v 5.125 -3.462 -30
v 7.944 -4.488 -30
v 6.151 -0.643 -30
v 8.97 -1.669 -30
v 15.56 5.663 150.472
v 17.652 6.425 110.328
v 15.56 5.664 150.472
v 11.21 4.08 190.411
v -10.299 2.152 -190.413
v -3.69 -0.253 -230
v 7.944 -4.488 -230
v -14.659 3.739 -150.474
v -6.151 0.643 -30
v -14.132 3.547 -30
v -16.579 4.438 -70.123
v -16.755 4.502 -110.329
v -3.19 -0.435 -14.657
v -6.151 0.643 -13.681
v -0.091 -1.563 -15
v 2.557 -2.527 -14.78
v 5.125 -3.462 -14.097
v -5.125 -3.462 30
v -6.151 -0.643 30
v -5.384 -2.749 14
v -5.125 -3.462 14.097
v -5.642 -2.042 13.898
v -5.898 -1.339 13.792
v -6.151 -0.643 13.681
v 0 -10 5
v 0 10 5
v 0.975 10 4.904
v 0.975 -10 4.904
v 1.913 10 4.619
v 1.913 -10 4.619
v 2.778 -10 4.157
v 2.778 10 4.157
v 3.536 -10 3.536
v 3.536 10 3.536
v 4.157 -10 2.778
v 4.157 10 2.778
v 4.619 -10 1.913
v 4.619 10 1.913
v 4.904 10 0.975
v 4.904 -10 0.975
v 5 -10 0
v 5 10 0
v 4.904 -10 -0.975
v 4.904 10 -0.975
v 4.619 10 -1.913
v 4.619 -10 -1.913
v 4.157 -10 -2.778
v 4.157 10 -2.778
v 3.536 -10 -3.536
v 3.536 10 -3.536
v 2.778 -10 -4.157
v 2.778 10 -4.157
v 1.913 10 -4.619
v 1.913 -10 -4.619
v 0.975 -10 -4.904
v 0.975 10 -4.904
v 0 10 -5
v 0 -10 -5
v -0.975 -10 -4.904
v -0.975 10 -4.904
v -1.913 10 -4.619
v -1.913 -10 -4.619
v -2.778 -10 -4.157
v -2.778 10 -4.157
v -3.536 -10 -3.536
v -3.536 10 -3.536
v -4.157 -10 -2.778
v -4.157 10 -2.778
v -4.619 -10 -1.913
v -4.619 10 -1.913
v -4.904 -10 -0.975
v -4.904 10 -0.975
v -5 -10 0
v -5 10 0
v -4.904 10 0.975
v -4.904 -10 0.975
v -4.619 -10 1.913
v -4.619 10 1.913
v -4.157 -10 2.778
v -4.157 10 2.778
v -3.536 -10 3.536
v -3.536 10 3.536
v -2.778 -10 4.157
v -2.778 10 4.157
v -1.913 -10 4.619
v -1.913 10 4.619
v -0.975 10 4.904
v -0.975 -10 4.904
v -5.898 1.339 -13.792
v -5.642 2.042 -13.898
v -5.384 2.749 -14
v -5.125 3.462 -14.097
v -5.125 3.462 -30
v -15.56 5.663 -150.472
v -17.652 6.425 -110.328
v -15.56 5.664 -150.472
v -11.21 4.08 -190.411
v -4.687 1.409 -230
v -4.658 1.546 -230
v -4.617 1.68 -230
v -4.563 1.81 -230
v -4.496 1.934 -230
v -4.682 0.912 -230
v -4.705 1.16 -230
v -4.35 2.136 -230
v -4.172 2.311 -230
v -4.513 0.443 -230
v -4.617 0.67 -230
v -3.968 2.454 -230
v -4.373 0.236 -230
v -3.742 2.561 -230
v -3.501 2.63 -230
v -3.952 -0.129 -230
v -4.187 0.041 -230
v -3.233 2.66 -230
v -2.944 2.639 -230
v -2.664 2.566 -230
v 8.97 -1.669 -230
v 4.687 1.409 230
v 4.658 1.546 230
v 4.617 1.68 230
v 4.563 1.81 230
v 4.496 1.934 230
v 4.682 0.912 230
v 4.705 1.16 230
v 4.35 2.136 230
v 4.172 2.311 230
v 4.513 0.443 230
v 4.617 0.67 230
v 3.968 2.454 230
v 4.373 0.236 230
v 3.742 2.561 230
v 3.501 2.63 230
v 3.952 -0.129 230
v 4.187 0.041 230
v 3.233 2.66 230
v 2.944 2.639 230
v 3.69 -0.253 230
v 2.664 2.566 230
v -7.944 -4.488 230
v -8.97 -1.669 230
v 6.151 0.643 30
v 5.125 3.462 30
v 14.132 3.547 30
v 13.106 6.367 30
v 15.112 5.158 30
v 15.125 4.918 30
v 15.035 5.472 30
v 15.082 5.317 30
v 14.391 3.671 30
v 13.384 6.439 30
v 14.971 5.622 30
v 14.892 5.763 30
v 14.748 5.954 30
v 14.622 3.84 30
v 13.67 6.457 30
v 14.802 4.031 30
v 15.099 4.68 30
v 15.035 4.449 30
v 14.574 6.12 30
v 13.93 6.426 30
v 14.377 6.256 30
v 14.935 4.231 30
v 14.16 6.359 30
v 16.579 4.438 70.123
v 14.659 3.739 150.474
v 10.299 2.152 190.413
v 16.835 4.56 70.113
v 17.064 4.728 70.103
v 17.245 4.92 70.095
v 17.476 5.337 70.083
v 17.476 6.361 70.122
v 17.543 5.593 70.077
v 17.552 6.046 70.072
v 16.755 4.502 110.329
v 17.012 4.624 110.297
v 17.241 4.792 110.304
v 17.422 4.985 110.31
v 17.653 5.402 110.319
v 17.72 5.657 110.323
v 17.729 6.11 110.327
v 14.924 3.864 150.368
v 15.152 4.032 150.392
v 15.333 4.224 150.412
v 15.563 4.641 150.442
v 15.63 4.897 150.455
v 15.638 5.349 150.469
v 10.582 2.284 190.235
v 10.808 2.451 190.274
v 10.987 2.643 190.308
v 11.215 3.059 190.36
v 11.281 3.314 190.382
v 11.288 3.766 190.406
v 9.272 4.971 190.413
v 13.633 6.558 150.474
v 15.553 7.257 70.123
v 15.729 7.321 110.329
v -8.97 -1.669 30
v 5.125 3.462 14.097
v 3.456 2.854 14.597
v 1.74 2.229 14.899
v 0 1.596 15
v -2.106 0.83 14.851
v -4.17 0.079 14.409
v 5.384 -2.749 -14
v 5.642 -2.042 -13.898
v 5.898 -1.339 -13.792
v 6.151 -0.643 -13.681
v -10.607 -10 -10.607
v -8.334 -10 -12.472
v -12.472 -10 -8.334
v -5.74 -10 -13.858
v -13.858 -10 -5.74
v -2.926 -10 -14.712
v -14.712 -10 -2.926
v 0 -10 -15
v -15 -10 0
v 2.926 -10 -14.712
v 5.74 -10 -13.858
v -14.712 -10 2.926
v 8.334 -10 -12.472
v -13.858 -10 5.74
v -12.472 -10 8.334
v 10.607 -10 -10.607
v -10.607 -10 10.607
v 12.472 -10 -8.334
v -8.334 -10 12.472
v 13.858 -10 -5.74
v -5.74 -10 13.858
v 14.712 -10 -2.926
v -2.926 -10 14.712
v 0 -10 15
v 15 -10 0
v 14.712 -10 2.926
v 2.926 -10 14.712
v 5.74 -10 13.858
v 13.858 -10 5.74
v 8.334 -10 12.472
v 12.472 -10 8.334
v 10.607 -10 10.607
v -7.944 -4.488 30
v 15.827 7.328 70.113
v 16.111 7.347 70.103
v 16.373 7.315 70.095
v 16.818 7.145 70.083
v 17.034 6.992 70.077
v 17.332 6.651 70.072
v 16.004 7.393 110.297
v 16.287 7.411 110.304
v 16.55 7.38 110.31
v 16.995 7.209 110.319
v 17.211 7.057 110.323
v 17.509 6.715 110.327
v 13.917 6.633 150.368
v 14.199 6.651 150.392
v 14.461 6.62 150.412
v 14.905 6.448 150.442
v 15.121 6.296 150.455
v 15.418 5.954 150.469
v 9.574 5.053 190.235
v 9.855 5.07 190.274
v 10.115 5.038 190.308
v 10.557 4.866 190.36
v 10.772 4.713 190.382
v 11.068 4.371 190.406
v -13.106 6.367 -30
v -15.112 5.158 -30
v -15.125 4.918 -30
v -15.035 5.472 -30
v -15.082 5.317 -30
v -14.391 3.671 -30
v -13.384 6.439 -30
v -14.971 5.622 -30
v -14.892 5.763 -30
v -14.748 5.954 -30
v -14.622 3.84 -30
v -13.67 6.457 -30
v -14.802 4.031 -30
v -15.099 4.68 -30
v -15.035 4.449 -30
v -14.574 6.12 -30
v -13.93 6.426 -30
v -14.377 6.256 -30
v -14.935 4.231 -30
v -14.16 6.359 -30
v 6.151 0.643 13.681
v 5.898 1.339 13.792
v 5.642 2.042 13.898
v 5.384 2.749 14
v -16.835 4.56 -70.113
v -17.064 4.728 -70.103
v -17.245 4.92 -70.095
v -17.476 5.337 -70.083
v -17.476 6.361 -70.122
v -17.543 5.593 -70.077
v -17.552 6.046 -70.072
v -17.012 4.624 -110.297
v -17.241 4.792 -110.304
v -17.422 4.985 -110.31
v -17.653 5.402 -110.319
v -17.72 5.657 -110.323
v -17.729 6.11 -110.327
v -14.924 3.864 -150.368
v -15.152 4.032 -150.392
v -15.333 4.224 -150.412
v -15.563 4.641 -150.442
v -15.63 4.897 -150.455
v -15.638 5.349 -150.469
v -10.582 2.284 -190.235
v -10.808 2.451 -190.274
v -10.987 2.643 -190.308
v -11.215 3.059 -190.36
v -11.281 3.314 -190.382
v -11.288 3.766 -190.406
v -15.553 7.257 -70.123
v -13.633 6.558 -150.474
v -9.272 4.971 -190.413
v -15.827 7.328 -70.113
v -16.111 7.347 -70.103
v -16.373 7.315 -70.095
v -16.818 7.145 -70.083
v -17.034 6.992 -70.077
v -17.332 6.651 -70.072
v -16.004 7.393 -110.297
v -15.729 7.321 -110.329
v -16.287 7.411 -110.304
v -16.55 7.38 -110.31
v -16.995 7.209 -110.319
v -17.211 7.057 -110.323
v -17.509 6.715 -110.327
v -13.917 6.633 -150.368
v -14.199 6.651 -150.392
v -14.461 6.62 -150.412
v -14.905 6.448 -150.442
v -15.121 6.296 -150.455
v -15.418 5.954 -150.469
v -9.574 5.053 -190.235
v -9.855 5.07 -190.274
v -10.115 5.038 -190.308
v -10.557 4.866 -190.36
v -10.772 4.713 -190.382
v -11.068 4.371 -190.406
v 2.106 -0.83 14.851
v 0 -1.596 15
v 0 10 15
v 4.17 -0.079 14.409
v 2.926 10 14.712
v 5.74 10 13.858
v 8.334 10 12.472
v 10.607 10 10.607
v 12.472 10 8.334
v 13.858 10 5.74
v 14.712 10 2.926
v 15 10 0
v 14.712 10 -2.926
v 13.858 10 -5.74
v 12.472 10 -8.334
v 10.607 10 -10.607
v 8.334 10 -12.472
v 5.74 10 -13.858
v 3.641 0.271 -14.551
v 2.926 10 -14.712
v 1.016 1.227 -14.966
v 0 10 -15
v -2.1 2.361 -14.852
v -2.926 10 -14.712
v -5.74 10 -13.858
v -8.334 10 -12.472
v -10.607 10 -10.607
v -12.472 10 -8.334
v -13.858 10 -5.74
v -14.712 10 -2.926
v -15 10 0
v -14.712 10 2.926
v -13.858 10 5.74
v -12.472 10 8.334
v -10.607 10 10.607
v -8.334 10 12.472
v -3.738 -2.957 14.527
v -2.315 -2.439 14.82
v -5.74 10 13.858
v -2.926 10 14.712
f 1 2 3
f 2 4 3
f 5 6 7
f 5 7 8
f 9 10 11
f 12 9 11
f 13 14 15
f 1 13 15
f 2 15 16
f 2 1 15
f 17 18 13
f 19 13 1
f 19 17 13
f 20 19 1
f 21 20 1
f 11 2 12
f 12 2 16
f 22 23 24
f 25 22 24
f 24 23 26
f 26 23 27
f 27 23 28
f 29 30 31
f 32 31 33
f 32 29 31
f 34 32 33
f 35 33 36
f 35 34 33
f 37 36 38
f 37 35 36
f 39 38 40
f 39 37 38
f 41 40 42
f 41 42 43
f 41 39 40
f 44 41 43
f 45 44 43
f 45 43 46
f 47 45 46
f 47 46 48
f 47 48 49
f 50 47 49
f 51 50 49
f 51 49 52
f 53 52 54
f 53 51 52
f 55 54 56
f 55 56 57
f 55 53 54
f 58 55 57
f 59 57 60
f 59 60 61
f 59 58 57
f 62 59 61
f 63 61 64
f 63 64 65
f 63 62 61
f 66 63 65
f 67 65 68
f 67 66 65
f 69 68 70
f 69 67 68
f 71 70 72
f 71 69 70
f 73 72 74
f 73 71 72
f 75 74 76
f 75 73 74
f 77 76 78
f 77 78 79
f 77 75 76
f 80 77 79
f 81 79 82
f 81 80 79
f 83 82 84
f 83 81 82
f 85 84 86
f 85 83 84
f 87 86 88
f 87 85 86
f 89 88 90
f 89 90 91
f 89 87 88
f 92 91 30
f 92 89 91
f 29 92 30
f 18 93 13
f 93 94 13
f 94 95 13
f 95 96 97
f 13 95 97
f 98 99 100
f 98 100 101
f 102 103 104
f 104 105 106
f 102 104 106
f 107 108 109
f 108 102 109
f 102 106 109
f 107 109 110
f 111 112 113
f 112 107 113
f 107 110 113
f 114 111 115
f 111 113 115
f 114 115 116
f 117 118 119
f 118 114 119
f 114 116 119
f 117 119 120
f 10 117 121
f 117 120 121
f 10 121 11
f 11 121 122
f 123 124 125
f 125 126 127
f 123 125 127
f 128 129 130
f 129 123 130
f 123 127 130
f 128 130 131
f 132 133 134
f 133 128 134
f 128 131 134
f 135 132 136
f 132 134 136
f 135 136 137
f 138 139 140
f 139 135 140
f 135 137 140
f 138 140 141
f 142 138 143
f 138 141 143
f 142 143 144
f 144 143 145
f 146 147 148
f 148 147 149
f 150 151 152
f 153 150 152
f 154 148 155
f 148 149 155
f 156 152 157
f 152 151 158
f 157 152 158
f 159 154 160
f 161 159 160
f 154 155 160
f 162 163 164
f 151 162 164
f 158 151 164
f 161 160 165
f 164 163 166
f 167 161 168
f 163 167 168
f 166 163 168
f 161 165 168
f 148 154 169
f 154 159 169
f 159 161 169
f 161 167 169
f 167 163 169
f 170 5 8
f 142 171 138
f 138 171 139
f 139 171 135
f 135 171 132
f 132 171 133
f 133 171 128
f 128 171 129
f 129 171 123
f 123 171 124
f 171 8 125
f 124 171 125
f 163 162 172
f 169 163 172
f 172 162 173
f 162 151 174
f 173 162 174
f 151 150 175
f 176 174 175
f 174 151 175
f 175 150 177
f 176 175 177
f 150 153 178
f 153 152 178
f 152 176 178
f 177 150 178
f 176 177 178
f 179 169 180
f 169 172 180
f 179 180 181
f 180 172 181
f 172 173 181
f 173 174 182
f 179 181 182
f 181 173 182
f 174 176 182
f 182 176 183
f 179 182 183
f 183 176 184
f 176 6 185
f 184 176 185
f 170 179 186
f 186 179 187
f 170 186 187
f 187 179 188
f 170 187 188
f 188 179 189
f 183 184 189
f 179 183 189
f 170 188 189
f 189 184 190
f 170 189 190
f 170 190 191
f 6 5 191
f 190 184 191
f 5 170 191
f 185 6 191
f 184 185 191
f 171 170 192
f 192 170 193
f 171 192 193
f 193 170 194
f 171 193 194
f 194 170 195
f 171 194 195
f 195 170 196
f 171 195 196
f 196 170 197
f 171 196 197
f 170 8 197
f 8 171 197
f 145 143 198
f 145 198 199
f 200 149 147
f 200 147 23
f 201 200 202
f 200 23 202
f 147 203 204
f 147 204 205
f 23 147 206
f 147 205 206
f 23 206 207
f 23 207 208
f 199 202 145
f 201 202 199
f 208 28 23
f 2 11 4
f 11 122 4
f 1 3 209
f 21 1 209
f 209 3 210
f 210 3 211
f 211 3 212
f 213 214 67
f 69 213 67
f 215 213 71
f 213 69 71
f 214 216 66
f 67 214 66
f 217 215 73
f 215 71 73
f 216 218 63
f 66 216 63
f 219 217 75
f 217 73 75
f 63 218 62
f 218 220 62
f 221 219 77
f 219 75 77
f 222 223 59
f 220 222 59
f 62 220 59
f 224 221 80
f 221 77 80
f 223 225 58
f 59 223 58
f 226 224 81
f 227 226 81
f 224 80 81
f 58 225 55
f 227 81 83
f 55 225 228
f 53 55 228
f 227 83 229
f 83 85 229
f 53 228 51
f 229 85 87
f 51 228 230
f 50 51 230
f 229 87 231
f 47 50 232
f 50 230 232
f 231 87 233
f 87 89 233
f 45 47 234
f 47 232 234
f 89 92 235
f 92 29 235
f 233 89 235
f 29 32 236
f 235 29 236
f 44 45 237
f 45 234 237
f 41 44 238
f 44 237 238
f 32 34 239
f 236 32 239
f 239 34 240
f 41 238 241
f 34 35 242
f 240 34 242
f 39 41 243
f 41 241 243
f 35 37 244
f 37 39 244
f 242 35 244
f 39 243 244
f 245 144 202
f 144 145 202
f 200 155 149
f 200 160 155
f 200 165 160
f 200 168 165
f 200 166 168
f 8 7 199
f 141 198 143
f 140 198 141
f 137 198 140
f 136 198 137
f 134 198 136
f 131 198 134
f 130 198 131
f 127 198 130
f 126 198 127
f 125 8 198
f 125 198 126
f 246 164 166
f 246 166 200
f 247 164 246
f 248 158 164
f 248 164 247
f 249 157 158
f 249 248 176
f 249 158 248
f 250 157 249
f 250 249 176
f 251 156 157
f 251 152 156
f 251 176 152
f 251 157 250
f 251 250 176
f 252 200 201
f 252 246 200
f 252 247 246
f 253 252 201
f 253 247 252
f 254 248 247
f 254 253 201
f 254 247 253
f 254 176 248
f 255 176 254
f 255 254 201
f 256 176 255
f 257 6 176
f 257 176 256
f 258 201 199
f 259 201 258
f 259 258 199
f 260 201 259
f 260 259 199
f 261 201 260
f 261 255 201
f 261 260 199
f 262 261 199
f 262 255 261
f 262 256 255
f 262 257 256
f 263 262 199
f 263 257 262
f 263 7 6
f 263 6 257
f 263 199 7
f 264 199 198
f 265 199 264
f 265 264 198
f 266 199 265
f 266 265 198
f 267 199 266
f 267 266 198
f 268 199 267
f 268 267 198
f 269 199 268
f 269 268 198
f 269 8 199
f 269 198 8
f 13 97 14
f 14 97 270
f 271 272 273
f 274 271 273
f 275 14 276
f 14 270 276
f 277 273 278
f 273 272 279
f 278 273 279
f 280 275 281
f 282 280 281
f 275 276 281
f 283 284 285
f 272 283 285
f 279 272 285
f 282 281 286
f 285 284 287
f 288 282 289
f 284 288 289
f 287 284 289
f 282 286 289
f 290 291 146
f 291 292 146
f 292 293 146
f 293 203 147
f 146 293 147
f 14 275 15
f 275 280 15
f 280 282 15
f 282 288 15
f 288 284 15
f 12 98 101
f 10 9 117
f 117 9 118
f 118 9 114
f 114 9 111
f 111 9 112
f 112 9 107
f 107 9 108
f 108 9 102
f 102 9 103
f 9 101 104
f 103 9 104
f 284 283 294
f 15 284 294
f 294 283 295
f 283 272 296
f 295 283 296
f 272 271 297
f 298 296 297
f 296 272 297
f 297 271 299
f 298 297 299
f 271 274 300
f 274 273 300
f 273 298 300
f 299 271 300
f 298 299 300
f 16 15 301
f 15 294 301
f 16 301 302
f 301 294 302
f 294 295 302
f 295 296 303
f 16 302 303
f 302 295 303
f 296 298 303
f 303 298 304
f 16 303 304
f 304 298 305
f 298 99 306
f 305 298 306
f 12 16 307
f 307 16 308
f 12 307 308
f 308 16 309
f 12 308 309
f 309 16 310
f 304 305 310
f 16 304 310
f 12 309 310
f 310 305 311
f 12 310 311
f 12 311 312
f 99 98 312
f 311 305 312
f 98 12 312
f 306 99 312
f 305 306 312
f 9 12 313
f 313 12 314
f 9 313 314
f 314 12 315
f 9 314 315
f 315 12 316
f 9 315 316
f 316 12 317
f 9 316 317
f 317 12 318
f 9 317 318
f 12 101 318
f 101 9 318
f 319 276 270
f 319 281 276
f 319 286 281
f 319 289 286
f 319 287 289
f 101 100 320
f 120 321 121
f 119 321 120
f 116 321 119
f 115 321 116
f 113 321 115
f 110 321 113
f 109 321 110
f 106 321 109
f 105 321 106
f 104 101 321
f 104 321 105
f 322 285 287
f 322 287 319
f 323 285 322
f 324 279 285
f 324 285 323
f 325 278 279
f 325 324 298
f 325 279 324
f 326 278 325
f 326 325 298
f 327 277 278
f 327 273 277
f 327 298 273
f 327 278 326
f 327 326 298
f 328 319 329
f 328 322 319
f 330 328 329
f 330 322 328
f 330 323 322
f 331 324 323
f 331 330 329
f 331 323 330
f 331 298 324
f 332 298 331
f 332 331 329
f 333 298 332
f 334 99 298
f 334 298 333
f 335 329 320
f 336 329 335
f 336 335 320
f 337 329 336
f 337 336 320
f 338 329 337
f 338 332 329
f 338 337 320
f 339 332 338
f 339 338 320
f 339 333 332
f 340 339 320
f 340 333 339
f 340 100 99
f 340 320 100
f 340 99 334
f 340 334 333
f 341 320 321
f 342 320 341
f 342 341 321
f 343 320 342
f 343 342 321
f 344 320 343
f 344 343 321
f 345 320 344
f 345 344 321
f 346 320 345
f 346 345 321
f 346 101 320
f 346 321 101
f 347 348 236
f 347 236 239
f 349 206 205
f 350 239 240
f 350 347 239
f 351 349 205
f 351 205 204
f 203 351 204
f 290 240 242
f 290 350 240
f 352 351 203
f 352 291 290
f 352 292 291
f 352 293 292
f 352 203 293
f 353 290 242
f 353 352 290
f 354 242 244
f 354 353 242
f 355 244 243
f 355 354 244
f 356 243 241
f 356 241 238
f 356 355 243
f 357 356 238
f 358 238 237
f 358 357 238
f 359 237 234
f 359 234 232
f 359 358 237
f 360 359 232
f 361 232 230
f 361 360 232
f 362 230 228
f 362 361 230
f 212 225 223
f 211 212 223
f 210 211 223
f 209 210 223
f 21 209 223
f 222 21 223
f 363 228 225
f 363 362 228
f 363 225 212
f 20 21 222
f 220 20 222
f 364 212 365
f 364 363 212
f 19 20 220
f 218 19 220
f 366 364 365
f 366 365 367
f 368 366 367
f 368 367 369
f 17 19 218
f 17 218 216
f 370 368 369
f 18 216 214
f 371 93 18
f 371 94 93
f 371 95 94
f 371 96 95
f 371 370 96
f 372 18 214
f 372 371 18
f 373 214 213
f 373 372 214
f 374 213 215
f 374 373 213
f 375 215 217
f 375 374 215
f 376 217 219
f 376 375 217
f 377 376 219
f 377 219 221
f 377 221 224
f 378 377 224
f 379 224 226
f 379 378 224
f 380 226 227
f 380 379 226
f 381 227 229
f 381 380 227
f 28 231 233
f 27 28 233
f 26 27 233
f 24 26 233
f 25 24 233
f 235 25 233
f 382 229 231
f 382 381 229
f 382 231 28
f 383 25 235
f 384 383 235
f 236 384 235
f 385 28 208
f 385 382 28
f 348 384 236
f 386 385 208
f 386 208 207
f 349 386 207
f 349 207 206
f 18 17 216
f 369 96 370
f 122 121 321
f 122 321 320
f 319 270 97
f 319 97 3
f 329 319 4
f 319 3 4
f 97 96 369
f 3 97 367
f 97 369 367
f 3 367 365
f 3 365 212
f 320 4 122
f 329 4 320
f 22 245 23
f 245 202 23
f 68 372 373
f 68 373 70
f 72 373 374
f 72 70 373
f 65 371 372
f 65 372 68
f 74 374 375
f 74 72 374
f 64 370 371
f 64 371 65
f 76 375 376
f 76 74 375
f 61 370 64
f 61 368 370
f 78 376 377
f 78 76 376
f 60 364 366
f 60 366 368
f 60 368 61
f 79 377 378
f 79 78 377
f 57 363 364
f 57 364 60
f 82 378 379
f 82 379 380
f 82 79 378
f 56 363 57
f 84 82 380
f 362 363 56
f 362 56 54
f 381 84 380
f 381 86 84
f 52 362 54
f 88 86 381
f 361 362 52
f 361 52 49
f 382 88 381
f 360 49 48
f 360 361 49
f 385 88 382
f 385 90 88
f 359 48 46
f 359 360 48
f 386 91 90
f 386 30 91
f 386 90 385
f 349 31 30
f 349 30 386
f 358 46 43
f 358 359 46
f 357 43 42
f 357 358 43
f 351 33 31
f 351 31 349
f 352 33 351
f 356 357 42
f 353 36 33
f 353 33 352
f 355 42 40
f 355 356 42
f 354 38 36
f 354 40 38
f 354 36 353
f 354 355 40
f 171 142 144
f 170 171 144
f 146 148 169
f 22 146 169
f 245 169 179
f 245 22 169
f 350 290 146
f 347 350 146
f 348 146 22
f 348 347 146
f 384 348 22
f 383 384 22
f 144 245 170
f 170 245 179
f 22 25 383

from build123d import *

# Parameters (mm, degrees)
SKETCH1_R                = 15
SKETCH1_R_2              = 5
BOSS_EXTRUDE1_DEPTH      = 10
BOSS_EXTRUDE2_DEPTH      = 1.5
FILLET1_R                = 1.5
CIRPATTERN1_COUNT        = 2
FILLET1_OF_CIRPATTERN1_R = 1.5


with BuildPart() as part:
    # Sketch1 → Boss-Extrude1 (new, symmetric)
    with BuildSketch(Plane(origin=(0, 0, 0), x_dir=(1, 0, 0), z_dir=(0, 1, 0))):
        with Locations(Location((0, 0, 0), (0, 0, 270))):
            Circle(SKETCH1_R)
        with Locations(Location((0, 0, 0), (0, 0, 270))):
            Circle(SKETCH1_R_2, mode=Mode.SUBTRACT)
    extrude(amount=BOSS_EXTRUDE1_DEPTH, both=True)

    # Sketch3 → Boss-Extrude2 (add, symmetric)
    with BuildSketch(Plane(origin=(0, 0, 0), x_dir=(-0.9396926207859095, 0.34202014332566577, 0), z_dir=(0.34202014332566577, 0.9396926207859095, 0))):
        with BuildLine():
            Line((6, -13), (6, -30))
            Line((6, -30), (16, -30))
            ThreePointArc((16, -30), (17.972915249, -130.416666562), (4.913090625, -230))
            Line((4.913090625, -230), (-9, -230))
            Line((-9, -230), (-9, -30))
            Line((-9, -30), (-6, -30))
            Line((-6, -30), (-6, -13))
            ThreePointArc((-6, -13), (0, -14.094026279), (6, -13))
        make_face()
    boss_extrude2 = extrude(amount=BOSS_EXTRUDE2_DEPTH, both=True)

    # Fillet1
    fillet1_edges = [part.edges().sort_by_distance(p)[0] for p in [
        (-16.375985619, 7.556637981, -130.416666562),
        (-17.402046049, 4.737560118, -130.416666562),
    ]]
    fillet(fillet1_edges, radius=FILLET1_R - 0.0001)  # a hair under: the kernel refuses the full size

    # CirPattern1: Boss-Extrude2 ×2 about axis
    cirpattern1_axis = Axis((0, 0, 0), (0, 1, 0))
    for i in range(1, CIRPATTERN1_COUNT):
        add(boss_extrude2.rotate(cirpattern1_axis, i * 360 / CIRPATTERN1_COUNT))

    # Fillet1 of CirPattern1
    fillet1_of_cirpattern1_edges = [part.edges().sort_by_distance(p)[0] for p in [
        (16.375985619, 7.556637981, 130.416666562),
        (17.402046049, 4.737560118, 130.416666562),
    ]]
    fillet(fillet1_of_cirpattern1_edges, radius=FILLET1_OF_CIRPATTERN1_R - 0.0001)  # a hair under: the kernel refuses the full size


solid = part.part
